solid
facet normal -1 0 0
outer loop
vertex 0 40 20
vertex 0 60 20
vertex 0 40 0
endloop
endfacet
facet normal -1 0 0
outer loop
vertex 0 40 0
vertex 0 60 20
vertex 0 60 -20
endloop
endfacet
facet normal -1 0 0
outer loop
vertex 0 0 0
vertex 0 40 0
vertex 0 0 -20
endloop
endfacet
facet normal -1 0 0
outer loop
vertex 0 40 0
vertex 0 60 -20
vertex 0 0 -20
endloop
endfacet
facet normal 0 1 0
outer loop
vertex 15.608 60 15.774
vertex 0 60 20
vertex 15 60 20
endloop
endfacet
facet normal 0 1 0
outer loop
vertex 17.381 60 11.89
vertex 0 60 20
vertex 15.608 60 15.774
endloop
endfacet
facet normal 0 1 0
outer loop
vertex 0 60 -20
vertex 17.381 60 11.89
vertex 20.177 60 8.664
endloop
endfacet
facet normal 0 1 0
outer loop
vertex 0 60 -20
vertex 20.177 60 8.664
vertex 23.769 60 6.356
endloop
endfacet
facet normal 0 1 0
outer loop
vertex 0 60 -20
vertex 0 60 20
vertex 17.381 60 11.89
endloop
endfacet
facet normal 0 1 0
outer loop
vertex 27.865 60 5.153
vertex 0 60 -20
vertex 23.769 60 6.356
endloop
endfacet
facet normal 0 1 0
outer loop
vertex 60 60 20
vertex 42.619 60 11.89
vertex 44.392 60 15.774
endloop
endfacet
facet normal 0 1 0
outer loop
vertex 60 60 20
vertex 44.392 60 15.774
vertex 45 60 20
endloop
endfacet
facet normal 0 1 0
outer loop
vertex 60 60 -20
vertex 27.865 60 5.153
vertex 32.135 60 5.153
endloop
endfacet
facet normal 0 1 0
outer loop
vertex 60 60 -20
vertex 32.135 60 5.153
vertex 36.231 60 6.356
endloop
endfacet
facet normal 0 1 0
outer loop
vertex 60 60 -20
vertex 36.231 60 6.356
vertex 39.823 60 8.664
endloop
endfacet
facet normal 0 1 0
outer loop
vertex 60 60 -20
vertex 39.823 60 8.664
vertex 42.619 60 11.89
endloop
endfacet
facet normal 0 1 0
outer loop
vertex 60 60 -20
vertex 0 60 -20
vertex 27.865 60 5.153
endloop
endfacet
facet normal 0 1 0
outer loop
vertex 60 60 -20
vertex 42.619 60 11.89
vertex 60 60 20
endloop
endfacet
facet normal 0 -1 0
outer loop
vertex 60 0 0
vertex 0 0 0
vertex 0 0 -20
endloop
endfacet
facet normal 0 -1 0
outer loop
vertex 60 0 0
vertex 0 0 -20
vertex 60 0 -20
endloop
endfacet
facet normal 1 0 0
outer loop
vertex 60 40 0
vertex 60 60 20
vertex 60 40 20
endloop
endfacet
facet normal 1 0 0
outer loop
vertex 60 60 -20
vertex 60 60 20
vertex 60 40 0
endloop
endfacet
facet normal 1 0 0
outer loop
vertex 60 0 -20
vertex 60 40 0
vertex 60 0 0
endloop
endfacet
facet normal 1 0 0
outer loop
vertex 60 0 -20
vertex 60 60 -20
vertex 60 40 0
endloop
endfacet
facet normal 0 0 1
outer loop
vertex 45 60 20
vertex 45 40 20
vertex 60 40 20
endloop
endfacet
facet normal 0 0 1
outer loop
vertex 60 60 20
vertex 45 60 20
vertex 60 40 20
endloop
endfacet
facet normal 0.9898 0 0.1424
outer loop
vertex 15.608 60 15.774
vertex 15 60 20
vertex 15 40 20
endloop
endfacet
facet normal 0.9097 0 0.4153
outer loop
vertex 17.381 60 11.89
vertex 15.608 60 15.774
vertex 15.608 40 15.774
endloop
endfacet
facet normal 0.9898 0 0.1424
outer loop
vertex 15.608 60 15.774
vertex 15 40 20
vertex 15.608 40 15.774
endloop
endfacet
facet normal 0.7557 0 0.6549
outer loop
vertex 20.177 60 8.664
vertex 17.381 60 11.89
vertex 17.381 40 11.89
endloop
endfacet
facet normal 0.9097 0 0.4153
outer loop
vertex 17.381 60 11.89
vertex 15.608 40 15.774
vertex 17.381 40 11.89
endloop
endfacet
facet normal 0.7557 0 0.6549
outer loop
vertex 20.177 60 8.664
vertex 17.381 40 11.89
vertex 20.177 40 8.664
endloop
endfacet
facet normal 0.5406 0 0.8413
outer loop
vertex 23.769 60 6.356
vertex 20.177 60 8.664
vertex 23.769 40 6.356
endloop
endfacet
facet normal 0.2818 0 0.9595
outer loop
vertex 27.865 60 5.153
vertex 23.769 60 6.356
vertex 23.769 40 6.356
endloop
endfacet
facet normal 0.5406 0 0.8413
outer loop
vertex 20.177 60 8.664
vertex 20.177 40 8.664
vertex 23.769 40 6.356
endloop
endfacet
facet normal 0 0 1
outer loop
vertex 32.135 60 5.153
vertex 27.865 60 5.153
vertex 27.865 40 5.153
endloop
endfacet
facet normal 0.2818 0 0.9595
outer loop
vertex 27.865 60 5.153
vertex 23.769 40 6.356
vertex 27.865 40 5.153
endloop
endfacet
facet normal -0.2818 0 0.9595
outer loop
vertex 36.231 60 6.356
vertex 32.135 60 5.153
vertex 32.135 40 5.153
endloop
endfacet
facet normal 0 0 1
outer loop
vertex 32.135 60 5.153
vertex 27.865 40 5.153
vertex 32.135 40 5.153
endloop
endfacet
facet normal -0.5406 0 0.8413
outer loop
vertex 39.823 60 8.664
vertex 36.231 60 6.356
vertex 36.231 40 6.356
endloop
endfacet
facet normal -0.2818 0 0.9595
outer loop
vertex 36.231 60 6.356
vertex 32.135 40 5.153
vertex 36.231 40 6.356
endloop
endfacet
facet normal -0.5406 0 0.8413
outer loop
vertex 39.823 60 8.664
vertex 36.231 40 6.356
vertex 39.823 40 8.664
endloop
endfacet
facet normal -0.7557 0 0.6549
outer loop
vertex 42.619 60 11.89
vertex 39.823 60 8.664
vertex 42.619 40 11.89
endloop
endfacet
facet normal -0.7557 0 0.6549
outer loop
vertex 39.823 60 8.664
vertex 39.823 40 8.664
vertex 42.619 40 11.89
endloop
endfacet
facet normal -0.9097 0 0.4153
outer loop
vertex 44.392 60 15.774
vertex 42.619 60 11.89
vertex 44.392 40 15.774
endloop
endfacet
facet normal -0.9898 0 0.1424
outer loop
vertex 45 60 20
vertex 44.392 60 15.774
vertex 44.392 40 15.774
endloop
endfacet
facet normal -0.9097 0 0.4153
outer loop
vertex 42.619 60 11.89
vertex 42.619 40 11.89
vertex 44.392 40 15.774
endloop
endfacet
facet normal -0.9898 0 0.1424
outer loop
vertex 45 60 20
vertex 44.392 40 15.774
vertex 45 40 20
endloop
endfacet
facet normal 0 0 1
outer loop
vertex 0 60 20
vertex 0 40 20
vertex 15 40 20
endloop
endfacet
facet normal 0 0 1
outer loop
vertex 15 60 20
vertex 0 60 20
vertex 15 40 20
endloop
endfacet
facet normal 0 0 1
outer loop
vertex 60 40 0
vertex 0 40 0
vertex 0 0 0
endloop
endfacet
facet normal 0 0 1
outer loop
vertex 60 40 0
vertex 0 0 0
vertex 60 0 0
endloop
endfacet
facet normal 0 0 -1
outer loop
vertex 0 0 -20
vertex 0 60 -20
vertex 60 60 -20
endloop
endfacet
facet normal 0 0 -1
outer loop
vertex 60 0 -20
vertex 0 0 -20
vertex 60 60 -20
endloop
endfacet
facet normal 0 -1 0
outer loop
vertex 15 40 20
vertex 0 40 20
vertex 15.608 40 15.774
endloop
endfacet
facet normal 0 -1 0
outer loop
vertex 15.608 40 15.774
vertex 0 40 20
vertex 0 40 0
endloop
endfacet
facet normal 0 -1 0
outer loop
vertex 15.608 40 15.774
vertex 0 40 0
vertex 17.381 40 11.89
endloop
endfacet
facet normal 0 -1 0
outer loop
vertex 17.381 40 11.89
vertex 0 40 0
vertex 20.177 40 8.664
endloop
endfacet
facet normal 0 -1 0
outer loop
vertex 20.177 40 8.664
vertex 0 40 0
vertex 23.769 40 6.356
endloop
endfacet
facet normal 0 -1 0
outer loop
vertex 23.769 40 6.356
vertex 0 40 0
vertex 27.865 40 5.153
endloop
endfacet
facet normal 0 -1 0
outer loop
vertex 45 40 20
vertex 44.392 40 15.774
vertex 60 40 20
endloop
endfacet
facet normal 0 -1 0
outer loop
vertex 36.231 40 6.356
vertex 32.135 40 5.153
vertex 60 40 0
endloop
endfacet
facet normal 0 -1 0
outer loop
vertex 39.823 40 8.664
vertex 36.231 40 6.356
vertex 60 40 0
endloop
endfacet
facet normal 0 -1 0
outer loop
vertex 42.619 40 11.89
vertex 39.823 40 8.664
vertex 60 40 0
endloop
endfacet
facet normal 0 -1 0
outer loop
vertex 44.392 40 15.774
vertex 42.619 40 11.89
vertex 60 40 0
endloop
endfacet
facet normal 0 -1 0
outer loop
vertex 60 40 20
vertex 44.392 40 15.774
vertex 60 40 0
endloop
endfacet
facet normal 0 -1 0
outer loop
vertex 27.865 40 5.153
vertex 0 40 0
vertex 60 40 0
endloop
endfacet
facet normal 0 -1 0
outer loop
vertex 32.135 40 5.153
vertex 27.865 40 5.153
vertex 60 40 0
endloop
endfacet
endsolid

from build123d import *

# Parameters (mm, degrees)
F0_W     = 60
F0_H     = 60
F1_DEPTH = 20
F2_W     = 60
F2_H     = 20
F3_DEPTH = 40
F5_DEPTH = 25


with BuildPart() as f1:
    # F0 (on Top) → F1 (new body)
    with BuildSketch(Plane.XY):
        with Locations((30, 30)):
            Rectangle(F0_W, F0_H)
    extrude(amount=-F1_DEPTH)

    # F2 (on face) → F3 (join)
    with BuildSketch(Plane(origin=(0, 0, -20), x_dir=(1, 0, 0), z_dir=(0, 0, -1))):
        with Locations((30, -50)):
            Rectangle(F2_W, F2_H)
    extrude(amount=-F3_DEPTH)

    # F4 (on face) → F5 (cut)
    with BuildSketch(Plane.XZ.offset(-40)):
        with BuildLine():
            Line((45, 20), (15, 20))
            ThreePointArc((15, 20), (30, 5), (45, 20))
        make_face()
    extrude(amount=-F5_DEPTH, mode=Mode.SUBTRACT)


solid = f1.part
